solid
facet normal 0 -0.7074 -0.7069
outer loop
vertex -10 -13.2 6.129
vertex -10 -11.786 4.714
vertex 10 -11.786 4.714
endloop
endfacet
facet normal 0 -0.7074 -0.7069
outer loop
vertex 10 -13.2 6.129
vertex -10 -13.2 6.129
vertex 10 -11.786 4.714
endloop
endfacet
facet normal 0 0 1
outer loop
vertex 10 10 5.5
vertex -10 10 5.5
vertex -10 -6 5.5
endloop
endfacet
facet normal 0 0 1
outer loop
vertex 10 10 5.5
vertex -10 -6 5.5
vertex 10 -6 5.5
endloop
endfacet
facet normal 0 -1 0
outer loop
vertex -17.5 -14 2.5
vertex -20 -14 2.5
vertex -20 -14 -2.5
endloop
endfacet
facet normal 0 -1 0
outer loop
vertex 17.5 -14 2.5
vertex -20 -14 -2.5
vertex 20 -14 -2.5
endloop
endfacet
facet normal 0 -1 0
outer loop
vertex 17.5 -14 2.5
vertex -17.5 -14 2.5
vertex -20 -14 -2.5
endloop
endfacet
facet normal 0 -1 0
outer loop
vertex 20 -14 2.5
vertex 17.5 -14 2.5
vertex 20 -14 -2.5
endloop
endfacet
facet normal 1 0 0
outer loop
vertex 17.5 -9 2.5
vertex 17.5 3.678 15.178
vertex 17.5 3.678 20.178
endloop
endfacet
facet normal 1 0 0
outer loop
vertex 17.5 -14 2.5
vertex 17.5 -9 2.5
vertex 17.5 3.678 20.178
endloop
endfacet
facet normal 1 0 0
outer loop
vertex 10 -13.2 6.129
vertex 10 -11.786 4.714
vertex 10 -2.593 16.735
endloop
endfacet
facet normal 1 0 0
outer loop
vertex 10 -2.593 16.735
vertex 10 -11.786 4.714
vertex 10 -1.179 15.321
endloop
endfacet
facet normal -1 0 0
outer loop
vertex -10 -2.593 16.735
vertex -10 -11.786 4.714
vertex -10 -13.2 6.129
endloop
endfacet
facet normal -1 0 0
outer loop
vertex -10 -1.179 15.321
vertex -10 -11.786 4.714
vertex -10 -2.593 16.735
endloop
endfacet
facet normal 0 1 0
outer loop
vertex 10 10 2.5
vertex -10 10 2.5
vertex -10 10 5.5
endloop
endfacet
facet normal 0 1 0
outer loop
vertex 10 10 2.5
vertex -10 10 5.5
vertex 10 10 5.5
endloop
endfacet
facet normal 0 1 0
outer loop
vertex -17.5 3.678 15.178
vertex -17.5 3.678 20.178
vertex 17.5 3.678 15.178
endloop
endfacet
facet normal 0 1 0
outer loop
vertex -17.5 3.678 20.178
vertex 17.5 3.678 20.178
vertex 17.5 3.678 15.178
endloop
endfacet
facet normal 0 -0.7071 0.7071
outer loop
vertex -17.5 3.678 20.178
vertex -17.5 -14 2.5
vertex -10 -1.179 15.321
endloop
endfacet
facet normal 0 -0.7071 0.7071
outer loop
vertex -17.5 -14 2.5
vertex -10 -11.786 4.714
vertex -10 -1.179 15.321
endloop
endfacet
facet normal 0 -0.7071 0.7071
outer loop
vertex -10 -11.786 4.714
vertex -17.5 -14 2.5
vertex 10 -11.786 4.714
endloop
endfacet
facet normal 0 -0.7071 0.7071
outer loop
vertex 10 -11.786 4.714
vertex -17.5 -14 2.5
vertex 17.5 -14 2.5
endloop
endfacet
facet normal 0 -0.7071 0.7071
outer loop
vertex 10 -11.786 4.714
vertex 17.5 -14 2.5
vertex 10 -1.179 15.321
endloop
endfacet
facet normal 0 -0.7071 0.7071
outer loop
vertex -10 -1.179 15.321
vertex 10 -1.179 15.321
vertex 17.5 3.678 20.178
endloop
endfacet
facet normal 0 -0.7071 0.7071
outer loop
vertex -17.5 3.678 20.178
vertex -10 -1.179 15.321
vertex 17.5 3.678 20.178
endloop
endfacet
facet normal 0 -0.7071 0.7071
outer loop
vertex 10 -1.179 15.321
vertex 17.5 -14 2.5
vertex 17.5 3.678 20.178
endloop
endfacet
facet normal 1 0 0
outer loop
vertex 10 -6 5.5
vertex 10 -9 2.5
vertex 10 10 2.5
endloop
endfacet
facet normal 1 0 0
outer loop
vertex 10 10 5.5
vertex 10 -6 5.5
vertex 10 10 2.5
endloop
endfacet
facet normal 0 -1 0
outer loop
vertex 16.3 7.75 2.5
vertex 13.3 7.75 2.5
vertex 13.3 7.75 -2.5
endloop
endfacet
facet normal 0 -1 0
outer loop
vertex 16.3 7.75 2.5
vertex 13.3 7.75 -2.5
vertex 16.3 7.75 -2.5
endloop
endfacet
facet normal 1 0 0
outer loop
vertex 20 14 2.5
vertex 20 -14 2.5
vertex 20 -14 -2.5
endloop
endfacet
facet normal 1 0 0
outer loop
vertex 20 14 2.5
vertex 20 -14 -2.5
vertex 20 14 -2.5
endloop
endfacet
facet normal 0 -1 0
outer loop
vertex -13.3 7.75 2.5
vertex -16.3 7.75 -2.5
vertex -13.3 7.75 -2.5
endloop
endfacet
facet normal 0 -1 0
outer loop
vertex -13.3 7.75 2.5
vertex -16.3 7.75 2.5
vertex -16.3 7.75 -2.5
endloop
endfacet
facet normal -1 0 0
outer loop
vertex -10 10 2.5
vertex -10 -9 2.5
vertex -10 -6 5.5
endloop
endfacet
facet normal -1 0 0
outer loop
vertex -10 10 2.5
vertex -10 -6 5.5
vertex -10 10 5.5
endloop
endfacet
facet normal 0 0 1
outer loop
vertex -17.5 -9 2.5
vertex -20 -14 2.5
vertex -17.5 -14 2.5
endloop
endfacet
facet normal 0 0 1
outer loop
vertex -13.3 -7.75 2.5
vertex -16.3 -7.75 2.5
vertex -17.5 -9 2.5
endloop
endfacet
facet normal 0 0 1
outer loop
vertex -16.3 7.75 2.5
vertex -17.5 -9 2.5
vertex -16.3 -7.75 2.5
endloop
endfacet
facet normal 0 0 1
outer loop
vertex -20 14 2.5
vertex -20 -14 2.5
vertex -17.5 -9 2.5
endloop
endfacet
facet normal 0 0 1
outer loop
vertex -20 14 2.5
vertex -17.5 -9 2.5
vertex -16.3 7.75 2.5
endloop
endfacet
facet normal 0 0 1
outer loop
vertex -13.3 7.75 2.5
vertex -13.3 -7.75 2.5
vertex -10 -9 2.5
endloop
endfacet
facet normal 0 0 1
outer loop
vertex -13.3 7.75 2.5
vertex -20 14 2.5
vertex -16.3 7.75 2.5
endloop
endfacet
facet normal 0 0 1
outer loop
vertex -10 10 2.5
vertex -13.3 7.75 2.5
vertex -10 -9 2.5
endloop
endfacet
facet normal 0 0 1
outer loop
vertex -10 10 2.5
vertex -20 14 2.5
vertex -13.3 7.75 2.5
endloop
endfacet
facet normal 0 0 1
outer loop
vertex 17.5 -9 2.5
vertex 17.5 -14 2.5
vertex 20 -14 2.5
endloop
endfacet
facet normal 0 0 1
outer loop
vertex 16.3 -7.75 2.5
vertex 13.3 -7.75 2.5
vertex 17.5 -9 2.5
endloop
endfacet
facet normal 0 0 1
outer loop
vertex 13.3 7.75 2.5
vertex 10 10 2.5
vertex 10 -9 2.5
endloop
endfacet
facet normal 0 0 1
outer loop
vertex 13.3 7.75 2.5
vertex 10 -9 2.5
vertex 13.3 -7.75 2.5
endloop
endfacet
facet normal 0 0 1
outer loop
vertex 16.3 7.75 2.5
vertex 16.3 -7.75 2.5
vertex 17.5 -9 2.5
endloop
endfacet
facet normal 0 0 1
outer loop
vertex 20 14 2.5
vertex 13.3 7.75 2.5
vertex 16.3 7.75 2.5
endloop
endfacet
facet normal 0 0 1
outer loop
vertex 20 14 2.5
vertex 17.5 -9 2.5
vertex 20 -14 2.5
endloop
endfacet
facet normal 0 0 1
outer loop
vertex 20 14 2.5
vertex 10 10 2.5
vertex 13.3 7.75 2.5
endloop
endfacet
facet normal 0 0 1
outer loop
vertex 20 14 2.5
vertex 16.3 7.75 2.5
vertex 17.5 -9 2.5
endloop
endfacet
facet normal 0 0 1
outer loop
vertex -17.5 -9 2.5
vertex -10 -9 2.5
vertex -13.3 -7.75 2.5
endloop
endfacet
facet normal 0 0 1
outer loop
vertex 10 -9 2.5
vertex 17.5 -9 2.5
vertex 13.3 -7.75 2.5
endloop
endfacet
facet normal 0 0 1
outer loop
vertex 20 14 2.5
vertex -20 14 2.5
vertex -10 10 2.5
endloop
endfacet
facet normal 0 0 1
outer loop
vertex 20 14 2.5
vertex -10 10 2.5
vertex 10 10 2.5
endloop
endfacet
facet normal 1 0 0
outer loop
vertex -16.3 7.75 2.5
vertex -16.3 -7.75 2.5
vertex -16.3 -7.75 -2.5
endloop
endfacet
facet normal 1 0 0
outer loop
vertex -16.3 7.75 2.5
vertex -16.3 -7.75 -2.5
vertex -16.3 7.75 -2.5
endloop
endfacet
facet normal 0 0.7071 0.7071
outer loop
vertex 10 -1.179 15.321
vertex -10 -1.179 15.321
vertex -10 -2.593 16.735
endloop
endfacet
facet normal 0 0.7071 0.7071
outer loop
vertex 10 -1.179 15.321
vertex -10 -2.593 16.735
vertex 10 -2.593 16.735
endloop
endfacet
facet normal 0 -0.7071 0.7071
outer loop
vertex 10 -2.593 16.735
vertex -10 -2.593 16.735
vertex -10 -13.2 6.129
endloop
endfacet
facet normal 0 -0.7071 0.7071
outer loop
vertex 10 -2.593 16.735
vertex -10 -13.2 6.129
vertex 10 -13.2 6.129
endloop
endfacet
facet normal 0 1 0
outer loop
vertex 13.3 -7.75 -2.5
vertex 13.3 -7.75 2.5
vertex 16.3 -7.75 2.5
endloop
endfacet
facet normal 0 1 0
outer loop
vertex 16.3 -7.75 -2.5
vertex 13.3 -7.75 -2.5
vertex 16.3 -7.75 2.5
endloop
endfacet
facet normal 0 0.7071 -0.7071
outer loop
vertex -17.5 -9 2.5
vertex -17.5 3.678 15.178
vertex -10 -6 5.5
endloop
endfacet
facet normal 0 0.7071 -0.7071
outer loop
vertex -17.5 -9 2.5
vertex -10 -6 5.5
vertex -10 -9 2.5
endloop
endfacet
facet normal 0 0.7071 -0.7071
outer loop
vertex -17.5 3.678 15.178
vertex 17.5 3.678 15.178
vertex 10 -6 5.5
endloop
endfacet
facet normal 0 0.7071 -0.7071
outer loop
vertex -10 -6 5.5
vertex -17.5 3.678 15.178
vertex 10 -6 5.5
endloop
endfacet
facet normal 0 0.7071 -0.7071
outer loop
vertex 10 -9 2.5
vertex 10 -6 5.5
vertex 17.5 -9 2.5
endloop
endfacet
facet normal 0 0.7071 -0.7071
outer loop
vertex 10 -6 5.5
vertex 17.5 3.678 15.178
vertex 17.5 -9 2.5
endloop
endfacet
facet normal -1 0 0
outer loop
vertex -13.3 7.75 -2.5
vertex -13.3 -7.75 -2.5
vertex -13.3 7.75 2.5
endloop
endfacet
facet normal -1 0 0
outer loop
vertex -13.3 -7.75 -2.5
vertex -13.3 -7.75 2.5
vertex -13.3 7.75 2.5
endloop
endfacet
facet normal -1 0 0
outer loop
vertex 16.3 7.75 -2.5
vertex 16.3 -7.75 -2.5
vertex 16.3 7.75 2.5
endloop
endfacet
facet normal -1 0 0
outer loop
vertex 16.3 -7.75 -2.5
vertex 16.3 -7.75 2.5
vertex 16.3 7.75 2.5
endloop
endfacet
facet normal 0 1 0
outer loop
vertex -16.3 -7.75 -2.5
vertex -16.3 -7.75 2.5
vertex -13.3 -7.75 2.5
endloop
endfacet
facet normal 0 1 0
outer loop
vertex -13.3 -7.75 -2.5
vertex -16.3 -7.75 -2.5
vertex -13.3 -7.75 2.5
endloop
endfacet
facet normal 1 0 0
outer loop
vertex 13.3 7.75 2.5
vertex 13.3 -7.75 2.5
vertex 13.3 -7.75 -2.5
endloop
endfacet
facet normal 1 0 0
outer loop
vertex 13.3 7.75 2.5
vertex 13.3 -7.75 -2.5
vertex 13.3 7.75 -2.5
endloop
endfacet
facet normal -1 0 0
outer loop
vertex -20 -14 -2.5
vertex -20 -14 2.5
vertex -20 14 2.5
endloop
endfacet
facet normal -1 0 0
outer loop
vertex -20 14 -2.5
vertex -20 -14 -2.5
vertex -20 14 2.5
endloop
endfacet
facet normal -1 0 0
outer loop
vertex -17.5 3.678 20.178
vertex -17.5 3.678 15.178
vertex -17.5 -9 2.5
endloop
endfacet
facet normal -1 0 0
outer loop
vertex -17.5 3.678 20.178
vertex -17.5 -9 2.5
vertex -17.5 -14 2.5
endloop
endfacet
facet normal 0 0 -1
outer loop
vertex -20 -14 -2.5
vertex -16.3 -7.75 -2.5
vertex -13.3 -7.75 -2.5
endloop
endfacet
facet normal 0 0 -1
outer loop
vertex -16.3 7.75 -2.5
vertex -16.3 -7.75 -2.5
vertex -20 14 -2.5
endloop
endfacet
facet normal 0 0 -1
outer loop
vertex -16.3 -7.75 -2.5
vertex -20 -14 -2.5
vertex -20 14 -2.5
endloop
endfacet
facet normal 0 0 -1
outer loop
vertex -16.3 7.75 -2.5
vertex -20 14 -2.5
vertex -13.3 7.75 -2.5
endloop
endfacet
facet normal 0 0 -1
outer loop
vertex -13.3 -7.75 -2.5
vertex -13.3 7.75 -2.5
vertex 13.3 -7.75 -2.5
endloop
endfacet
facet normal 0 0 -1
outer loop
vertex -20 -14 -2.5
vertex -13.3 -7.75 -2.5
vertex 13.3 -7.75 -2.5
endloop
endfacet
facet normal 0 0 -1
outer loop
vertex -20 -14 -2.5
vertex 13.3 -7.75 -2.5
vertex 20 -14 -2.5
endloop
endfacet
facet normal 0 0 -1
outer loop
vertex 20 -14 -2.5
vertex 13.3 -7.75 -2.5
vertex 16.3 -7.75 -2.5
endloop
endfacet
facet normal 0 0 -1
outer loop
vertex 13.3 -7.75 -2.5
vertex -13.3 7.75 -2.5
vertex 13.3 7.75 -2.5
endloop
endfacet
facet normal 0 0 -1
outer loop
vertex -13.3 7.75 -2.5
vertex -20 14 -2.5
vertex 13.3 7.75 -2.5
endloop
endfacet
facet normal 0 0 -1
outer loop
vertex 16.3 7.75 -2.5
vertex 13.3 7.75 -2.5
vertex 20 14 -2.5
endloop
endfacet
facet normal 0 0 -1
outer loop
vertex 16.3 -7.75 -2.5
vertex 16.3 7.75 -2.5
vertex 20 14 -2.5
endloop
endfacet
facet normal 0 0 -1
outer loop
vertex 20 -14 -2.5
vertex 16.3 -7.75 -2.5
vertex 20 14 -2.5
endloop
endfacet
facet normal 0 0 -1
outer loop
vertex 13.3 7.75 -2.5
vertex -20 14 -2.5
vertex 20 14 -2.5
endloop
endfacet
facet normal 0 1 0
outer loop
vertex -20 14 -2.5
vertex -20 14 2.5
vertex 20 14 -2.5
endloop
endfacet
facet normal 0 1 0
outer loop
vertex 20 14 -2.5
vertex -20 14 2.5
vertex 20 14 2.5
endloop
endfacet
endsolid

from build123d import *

# Parameters (mm, degrees)
CROQUIS1_W              = 40
CROQUIS1_H              = 28
CROQUIS1_W_2            = 3
CROQUIS1_H_2            = 15.5
SALIENTE_EXTRUIR1_DEPTH = 2.5
CROQUIS2_W              = 20
CROQUIS2_H              = 20
SALIENTE_EXTRUIR2_DEPTH = 3
SALIENTE_EXTRUIR3_DEPTH = 17.5
CROQUIS4_W              = 20
CROQUIS4_H              = 15
SALIENTE_EXTRUIR4_DEPTH = 2


with BuildPart() as part:
    # Croquis1 → Saliente-Extruir1 (new, symmetric)
    with BuildSketch(Plane.XY):
        Rectangle(CROQUIS1_W, CROQUIS1_H)
        with Locations((14.8, 0)):
            Rectangle(CROQUIS1_W_2, CROQUIS1_H_2, mode=Mode.SUBTRACT)
        with Locations((-14.8, 0)):
            Rectangle(CROQUIS1_W_2, CROQUIS1_H_2, mode=Mode.SUBTRACT)
    extrude(amount=SALIENTE_EXTRUIR1_DEPTH, both=True)

    # Croquis2 → Saliente-Extruir2 (add)
    with BuildSketch(Plane.XY.offset(2.5)):
        Rectangle(CROQUIS2_W, CROQUIS2_H)
    extrude(amount=SALIENTE_EXTRUIR2_DEPTH)

    # Croquis3 → Saliente-Extruir3 (add, symmetric)
    with BuildSketch(Plane(origin=(0, 0, 0), x_dir=(0, 0, -1), z_dir=(1, 0, 0))):
        Polygon((-2.5, -14), (-20.17766953, 3.67766953), (-15.17766953, 3.67766953), (-2.5, -9), align=None)
    extrude(amount=SALIENTE_EXTRUIR3_DEPTH, both=True)

    # Croquis4 → Saliente-Extruir4 (add)
    with BuildSketch(Plane(origin=(0, -8.25, 8.25), x_dir=(1, 0, 0), z_dir=(0, -0.7071067811865441, 0.707106781186551))):
        with Locations((0, 2.5)):
            Rectangle(CROQUIS4_W, CROQUIS4_H)
    extrude(amount=SALIENTE_EXTRUIR4_DEPTH)


solid = part.part
